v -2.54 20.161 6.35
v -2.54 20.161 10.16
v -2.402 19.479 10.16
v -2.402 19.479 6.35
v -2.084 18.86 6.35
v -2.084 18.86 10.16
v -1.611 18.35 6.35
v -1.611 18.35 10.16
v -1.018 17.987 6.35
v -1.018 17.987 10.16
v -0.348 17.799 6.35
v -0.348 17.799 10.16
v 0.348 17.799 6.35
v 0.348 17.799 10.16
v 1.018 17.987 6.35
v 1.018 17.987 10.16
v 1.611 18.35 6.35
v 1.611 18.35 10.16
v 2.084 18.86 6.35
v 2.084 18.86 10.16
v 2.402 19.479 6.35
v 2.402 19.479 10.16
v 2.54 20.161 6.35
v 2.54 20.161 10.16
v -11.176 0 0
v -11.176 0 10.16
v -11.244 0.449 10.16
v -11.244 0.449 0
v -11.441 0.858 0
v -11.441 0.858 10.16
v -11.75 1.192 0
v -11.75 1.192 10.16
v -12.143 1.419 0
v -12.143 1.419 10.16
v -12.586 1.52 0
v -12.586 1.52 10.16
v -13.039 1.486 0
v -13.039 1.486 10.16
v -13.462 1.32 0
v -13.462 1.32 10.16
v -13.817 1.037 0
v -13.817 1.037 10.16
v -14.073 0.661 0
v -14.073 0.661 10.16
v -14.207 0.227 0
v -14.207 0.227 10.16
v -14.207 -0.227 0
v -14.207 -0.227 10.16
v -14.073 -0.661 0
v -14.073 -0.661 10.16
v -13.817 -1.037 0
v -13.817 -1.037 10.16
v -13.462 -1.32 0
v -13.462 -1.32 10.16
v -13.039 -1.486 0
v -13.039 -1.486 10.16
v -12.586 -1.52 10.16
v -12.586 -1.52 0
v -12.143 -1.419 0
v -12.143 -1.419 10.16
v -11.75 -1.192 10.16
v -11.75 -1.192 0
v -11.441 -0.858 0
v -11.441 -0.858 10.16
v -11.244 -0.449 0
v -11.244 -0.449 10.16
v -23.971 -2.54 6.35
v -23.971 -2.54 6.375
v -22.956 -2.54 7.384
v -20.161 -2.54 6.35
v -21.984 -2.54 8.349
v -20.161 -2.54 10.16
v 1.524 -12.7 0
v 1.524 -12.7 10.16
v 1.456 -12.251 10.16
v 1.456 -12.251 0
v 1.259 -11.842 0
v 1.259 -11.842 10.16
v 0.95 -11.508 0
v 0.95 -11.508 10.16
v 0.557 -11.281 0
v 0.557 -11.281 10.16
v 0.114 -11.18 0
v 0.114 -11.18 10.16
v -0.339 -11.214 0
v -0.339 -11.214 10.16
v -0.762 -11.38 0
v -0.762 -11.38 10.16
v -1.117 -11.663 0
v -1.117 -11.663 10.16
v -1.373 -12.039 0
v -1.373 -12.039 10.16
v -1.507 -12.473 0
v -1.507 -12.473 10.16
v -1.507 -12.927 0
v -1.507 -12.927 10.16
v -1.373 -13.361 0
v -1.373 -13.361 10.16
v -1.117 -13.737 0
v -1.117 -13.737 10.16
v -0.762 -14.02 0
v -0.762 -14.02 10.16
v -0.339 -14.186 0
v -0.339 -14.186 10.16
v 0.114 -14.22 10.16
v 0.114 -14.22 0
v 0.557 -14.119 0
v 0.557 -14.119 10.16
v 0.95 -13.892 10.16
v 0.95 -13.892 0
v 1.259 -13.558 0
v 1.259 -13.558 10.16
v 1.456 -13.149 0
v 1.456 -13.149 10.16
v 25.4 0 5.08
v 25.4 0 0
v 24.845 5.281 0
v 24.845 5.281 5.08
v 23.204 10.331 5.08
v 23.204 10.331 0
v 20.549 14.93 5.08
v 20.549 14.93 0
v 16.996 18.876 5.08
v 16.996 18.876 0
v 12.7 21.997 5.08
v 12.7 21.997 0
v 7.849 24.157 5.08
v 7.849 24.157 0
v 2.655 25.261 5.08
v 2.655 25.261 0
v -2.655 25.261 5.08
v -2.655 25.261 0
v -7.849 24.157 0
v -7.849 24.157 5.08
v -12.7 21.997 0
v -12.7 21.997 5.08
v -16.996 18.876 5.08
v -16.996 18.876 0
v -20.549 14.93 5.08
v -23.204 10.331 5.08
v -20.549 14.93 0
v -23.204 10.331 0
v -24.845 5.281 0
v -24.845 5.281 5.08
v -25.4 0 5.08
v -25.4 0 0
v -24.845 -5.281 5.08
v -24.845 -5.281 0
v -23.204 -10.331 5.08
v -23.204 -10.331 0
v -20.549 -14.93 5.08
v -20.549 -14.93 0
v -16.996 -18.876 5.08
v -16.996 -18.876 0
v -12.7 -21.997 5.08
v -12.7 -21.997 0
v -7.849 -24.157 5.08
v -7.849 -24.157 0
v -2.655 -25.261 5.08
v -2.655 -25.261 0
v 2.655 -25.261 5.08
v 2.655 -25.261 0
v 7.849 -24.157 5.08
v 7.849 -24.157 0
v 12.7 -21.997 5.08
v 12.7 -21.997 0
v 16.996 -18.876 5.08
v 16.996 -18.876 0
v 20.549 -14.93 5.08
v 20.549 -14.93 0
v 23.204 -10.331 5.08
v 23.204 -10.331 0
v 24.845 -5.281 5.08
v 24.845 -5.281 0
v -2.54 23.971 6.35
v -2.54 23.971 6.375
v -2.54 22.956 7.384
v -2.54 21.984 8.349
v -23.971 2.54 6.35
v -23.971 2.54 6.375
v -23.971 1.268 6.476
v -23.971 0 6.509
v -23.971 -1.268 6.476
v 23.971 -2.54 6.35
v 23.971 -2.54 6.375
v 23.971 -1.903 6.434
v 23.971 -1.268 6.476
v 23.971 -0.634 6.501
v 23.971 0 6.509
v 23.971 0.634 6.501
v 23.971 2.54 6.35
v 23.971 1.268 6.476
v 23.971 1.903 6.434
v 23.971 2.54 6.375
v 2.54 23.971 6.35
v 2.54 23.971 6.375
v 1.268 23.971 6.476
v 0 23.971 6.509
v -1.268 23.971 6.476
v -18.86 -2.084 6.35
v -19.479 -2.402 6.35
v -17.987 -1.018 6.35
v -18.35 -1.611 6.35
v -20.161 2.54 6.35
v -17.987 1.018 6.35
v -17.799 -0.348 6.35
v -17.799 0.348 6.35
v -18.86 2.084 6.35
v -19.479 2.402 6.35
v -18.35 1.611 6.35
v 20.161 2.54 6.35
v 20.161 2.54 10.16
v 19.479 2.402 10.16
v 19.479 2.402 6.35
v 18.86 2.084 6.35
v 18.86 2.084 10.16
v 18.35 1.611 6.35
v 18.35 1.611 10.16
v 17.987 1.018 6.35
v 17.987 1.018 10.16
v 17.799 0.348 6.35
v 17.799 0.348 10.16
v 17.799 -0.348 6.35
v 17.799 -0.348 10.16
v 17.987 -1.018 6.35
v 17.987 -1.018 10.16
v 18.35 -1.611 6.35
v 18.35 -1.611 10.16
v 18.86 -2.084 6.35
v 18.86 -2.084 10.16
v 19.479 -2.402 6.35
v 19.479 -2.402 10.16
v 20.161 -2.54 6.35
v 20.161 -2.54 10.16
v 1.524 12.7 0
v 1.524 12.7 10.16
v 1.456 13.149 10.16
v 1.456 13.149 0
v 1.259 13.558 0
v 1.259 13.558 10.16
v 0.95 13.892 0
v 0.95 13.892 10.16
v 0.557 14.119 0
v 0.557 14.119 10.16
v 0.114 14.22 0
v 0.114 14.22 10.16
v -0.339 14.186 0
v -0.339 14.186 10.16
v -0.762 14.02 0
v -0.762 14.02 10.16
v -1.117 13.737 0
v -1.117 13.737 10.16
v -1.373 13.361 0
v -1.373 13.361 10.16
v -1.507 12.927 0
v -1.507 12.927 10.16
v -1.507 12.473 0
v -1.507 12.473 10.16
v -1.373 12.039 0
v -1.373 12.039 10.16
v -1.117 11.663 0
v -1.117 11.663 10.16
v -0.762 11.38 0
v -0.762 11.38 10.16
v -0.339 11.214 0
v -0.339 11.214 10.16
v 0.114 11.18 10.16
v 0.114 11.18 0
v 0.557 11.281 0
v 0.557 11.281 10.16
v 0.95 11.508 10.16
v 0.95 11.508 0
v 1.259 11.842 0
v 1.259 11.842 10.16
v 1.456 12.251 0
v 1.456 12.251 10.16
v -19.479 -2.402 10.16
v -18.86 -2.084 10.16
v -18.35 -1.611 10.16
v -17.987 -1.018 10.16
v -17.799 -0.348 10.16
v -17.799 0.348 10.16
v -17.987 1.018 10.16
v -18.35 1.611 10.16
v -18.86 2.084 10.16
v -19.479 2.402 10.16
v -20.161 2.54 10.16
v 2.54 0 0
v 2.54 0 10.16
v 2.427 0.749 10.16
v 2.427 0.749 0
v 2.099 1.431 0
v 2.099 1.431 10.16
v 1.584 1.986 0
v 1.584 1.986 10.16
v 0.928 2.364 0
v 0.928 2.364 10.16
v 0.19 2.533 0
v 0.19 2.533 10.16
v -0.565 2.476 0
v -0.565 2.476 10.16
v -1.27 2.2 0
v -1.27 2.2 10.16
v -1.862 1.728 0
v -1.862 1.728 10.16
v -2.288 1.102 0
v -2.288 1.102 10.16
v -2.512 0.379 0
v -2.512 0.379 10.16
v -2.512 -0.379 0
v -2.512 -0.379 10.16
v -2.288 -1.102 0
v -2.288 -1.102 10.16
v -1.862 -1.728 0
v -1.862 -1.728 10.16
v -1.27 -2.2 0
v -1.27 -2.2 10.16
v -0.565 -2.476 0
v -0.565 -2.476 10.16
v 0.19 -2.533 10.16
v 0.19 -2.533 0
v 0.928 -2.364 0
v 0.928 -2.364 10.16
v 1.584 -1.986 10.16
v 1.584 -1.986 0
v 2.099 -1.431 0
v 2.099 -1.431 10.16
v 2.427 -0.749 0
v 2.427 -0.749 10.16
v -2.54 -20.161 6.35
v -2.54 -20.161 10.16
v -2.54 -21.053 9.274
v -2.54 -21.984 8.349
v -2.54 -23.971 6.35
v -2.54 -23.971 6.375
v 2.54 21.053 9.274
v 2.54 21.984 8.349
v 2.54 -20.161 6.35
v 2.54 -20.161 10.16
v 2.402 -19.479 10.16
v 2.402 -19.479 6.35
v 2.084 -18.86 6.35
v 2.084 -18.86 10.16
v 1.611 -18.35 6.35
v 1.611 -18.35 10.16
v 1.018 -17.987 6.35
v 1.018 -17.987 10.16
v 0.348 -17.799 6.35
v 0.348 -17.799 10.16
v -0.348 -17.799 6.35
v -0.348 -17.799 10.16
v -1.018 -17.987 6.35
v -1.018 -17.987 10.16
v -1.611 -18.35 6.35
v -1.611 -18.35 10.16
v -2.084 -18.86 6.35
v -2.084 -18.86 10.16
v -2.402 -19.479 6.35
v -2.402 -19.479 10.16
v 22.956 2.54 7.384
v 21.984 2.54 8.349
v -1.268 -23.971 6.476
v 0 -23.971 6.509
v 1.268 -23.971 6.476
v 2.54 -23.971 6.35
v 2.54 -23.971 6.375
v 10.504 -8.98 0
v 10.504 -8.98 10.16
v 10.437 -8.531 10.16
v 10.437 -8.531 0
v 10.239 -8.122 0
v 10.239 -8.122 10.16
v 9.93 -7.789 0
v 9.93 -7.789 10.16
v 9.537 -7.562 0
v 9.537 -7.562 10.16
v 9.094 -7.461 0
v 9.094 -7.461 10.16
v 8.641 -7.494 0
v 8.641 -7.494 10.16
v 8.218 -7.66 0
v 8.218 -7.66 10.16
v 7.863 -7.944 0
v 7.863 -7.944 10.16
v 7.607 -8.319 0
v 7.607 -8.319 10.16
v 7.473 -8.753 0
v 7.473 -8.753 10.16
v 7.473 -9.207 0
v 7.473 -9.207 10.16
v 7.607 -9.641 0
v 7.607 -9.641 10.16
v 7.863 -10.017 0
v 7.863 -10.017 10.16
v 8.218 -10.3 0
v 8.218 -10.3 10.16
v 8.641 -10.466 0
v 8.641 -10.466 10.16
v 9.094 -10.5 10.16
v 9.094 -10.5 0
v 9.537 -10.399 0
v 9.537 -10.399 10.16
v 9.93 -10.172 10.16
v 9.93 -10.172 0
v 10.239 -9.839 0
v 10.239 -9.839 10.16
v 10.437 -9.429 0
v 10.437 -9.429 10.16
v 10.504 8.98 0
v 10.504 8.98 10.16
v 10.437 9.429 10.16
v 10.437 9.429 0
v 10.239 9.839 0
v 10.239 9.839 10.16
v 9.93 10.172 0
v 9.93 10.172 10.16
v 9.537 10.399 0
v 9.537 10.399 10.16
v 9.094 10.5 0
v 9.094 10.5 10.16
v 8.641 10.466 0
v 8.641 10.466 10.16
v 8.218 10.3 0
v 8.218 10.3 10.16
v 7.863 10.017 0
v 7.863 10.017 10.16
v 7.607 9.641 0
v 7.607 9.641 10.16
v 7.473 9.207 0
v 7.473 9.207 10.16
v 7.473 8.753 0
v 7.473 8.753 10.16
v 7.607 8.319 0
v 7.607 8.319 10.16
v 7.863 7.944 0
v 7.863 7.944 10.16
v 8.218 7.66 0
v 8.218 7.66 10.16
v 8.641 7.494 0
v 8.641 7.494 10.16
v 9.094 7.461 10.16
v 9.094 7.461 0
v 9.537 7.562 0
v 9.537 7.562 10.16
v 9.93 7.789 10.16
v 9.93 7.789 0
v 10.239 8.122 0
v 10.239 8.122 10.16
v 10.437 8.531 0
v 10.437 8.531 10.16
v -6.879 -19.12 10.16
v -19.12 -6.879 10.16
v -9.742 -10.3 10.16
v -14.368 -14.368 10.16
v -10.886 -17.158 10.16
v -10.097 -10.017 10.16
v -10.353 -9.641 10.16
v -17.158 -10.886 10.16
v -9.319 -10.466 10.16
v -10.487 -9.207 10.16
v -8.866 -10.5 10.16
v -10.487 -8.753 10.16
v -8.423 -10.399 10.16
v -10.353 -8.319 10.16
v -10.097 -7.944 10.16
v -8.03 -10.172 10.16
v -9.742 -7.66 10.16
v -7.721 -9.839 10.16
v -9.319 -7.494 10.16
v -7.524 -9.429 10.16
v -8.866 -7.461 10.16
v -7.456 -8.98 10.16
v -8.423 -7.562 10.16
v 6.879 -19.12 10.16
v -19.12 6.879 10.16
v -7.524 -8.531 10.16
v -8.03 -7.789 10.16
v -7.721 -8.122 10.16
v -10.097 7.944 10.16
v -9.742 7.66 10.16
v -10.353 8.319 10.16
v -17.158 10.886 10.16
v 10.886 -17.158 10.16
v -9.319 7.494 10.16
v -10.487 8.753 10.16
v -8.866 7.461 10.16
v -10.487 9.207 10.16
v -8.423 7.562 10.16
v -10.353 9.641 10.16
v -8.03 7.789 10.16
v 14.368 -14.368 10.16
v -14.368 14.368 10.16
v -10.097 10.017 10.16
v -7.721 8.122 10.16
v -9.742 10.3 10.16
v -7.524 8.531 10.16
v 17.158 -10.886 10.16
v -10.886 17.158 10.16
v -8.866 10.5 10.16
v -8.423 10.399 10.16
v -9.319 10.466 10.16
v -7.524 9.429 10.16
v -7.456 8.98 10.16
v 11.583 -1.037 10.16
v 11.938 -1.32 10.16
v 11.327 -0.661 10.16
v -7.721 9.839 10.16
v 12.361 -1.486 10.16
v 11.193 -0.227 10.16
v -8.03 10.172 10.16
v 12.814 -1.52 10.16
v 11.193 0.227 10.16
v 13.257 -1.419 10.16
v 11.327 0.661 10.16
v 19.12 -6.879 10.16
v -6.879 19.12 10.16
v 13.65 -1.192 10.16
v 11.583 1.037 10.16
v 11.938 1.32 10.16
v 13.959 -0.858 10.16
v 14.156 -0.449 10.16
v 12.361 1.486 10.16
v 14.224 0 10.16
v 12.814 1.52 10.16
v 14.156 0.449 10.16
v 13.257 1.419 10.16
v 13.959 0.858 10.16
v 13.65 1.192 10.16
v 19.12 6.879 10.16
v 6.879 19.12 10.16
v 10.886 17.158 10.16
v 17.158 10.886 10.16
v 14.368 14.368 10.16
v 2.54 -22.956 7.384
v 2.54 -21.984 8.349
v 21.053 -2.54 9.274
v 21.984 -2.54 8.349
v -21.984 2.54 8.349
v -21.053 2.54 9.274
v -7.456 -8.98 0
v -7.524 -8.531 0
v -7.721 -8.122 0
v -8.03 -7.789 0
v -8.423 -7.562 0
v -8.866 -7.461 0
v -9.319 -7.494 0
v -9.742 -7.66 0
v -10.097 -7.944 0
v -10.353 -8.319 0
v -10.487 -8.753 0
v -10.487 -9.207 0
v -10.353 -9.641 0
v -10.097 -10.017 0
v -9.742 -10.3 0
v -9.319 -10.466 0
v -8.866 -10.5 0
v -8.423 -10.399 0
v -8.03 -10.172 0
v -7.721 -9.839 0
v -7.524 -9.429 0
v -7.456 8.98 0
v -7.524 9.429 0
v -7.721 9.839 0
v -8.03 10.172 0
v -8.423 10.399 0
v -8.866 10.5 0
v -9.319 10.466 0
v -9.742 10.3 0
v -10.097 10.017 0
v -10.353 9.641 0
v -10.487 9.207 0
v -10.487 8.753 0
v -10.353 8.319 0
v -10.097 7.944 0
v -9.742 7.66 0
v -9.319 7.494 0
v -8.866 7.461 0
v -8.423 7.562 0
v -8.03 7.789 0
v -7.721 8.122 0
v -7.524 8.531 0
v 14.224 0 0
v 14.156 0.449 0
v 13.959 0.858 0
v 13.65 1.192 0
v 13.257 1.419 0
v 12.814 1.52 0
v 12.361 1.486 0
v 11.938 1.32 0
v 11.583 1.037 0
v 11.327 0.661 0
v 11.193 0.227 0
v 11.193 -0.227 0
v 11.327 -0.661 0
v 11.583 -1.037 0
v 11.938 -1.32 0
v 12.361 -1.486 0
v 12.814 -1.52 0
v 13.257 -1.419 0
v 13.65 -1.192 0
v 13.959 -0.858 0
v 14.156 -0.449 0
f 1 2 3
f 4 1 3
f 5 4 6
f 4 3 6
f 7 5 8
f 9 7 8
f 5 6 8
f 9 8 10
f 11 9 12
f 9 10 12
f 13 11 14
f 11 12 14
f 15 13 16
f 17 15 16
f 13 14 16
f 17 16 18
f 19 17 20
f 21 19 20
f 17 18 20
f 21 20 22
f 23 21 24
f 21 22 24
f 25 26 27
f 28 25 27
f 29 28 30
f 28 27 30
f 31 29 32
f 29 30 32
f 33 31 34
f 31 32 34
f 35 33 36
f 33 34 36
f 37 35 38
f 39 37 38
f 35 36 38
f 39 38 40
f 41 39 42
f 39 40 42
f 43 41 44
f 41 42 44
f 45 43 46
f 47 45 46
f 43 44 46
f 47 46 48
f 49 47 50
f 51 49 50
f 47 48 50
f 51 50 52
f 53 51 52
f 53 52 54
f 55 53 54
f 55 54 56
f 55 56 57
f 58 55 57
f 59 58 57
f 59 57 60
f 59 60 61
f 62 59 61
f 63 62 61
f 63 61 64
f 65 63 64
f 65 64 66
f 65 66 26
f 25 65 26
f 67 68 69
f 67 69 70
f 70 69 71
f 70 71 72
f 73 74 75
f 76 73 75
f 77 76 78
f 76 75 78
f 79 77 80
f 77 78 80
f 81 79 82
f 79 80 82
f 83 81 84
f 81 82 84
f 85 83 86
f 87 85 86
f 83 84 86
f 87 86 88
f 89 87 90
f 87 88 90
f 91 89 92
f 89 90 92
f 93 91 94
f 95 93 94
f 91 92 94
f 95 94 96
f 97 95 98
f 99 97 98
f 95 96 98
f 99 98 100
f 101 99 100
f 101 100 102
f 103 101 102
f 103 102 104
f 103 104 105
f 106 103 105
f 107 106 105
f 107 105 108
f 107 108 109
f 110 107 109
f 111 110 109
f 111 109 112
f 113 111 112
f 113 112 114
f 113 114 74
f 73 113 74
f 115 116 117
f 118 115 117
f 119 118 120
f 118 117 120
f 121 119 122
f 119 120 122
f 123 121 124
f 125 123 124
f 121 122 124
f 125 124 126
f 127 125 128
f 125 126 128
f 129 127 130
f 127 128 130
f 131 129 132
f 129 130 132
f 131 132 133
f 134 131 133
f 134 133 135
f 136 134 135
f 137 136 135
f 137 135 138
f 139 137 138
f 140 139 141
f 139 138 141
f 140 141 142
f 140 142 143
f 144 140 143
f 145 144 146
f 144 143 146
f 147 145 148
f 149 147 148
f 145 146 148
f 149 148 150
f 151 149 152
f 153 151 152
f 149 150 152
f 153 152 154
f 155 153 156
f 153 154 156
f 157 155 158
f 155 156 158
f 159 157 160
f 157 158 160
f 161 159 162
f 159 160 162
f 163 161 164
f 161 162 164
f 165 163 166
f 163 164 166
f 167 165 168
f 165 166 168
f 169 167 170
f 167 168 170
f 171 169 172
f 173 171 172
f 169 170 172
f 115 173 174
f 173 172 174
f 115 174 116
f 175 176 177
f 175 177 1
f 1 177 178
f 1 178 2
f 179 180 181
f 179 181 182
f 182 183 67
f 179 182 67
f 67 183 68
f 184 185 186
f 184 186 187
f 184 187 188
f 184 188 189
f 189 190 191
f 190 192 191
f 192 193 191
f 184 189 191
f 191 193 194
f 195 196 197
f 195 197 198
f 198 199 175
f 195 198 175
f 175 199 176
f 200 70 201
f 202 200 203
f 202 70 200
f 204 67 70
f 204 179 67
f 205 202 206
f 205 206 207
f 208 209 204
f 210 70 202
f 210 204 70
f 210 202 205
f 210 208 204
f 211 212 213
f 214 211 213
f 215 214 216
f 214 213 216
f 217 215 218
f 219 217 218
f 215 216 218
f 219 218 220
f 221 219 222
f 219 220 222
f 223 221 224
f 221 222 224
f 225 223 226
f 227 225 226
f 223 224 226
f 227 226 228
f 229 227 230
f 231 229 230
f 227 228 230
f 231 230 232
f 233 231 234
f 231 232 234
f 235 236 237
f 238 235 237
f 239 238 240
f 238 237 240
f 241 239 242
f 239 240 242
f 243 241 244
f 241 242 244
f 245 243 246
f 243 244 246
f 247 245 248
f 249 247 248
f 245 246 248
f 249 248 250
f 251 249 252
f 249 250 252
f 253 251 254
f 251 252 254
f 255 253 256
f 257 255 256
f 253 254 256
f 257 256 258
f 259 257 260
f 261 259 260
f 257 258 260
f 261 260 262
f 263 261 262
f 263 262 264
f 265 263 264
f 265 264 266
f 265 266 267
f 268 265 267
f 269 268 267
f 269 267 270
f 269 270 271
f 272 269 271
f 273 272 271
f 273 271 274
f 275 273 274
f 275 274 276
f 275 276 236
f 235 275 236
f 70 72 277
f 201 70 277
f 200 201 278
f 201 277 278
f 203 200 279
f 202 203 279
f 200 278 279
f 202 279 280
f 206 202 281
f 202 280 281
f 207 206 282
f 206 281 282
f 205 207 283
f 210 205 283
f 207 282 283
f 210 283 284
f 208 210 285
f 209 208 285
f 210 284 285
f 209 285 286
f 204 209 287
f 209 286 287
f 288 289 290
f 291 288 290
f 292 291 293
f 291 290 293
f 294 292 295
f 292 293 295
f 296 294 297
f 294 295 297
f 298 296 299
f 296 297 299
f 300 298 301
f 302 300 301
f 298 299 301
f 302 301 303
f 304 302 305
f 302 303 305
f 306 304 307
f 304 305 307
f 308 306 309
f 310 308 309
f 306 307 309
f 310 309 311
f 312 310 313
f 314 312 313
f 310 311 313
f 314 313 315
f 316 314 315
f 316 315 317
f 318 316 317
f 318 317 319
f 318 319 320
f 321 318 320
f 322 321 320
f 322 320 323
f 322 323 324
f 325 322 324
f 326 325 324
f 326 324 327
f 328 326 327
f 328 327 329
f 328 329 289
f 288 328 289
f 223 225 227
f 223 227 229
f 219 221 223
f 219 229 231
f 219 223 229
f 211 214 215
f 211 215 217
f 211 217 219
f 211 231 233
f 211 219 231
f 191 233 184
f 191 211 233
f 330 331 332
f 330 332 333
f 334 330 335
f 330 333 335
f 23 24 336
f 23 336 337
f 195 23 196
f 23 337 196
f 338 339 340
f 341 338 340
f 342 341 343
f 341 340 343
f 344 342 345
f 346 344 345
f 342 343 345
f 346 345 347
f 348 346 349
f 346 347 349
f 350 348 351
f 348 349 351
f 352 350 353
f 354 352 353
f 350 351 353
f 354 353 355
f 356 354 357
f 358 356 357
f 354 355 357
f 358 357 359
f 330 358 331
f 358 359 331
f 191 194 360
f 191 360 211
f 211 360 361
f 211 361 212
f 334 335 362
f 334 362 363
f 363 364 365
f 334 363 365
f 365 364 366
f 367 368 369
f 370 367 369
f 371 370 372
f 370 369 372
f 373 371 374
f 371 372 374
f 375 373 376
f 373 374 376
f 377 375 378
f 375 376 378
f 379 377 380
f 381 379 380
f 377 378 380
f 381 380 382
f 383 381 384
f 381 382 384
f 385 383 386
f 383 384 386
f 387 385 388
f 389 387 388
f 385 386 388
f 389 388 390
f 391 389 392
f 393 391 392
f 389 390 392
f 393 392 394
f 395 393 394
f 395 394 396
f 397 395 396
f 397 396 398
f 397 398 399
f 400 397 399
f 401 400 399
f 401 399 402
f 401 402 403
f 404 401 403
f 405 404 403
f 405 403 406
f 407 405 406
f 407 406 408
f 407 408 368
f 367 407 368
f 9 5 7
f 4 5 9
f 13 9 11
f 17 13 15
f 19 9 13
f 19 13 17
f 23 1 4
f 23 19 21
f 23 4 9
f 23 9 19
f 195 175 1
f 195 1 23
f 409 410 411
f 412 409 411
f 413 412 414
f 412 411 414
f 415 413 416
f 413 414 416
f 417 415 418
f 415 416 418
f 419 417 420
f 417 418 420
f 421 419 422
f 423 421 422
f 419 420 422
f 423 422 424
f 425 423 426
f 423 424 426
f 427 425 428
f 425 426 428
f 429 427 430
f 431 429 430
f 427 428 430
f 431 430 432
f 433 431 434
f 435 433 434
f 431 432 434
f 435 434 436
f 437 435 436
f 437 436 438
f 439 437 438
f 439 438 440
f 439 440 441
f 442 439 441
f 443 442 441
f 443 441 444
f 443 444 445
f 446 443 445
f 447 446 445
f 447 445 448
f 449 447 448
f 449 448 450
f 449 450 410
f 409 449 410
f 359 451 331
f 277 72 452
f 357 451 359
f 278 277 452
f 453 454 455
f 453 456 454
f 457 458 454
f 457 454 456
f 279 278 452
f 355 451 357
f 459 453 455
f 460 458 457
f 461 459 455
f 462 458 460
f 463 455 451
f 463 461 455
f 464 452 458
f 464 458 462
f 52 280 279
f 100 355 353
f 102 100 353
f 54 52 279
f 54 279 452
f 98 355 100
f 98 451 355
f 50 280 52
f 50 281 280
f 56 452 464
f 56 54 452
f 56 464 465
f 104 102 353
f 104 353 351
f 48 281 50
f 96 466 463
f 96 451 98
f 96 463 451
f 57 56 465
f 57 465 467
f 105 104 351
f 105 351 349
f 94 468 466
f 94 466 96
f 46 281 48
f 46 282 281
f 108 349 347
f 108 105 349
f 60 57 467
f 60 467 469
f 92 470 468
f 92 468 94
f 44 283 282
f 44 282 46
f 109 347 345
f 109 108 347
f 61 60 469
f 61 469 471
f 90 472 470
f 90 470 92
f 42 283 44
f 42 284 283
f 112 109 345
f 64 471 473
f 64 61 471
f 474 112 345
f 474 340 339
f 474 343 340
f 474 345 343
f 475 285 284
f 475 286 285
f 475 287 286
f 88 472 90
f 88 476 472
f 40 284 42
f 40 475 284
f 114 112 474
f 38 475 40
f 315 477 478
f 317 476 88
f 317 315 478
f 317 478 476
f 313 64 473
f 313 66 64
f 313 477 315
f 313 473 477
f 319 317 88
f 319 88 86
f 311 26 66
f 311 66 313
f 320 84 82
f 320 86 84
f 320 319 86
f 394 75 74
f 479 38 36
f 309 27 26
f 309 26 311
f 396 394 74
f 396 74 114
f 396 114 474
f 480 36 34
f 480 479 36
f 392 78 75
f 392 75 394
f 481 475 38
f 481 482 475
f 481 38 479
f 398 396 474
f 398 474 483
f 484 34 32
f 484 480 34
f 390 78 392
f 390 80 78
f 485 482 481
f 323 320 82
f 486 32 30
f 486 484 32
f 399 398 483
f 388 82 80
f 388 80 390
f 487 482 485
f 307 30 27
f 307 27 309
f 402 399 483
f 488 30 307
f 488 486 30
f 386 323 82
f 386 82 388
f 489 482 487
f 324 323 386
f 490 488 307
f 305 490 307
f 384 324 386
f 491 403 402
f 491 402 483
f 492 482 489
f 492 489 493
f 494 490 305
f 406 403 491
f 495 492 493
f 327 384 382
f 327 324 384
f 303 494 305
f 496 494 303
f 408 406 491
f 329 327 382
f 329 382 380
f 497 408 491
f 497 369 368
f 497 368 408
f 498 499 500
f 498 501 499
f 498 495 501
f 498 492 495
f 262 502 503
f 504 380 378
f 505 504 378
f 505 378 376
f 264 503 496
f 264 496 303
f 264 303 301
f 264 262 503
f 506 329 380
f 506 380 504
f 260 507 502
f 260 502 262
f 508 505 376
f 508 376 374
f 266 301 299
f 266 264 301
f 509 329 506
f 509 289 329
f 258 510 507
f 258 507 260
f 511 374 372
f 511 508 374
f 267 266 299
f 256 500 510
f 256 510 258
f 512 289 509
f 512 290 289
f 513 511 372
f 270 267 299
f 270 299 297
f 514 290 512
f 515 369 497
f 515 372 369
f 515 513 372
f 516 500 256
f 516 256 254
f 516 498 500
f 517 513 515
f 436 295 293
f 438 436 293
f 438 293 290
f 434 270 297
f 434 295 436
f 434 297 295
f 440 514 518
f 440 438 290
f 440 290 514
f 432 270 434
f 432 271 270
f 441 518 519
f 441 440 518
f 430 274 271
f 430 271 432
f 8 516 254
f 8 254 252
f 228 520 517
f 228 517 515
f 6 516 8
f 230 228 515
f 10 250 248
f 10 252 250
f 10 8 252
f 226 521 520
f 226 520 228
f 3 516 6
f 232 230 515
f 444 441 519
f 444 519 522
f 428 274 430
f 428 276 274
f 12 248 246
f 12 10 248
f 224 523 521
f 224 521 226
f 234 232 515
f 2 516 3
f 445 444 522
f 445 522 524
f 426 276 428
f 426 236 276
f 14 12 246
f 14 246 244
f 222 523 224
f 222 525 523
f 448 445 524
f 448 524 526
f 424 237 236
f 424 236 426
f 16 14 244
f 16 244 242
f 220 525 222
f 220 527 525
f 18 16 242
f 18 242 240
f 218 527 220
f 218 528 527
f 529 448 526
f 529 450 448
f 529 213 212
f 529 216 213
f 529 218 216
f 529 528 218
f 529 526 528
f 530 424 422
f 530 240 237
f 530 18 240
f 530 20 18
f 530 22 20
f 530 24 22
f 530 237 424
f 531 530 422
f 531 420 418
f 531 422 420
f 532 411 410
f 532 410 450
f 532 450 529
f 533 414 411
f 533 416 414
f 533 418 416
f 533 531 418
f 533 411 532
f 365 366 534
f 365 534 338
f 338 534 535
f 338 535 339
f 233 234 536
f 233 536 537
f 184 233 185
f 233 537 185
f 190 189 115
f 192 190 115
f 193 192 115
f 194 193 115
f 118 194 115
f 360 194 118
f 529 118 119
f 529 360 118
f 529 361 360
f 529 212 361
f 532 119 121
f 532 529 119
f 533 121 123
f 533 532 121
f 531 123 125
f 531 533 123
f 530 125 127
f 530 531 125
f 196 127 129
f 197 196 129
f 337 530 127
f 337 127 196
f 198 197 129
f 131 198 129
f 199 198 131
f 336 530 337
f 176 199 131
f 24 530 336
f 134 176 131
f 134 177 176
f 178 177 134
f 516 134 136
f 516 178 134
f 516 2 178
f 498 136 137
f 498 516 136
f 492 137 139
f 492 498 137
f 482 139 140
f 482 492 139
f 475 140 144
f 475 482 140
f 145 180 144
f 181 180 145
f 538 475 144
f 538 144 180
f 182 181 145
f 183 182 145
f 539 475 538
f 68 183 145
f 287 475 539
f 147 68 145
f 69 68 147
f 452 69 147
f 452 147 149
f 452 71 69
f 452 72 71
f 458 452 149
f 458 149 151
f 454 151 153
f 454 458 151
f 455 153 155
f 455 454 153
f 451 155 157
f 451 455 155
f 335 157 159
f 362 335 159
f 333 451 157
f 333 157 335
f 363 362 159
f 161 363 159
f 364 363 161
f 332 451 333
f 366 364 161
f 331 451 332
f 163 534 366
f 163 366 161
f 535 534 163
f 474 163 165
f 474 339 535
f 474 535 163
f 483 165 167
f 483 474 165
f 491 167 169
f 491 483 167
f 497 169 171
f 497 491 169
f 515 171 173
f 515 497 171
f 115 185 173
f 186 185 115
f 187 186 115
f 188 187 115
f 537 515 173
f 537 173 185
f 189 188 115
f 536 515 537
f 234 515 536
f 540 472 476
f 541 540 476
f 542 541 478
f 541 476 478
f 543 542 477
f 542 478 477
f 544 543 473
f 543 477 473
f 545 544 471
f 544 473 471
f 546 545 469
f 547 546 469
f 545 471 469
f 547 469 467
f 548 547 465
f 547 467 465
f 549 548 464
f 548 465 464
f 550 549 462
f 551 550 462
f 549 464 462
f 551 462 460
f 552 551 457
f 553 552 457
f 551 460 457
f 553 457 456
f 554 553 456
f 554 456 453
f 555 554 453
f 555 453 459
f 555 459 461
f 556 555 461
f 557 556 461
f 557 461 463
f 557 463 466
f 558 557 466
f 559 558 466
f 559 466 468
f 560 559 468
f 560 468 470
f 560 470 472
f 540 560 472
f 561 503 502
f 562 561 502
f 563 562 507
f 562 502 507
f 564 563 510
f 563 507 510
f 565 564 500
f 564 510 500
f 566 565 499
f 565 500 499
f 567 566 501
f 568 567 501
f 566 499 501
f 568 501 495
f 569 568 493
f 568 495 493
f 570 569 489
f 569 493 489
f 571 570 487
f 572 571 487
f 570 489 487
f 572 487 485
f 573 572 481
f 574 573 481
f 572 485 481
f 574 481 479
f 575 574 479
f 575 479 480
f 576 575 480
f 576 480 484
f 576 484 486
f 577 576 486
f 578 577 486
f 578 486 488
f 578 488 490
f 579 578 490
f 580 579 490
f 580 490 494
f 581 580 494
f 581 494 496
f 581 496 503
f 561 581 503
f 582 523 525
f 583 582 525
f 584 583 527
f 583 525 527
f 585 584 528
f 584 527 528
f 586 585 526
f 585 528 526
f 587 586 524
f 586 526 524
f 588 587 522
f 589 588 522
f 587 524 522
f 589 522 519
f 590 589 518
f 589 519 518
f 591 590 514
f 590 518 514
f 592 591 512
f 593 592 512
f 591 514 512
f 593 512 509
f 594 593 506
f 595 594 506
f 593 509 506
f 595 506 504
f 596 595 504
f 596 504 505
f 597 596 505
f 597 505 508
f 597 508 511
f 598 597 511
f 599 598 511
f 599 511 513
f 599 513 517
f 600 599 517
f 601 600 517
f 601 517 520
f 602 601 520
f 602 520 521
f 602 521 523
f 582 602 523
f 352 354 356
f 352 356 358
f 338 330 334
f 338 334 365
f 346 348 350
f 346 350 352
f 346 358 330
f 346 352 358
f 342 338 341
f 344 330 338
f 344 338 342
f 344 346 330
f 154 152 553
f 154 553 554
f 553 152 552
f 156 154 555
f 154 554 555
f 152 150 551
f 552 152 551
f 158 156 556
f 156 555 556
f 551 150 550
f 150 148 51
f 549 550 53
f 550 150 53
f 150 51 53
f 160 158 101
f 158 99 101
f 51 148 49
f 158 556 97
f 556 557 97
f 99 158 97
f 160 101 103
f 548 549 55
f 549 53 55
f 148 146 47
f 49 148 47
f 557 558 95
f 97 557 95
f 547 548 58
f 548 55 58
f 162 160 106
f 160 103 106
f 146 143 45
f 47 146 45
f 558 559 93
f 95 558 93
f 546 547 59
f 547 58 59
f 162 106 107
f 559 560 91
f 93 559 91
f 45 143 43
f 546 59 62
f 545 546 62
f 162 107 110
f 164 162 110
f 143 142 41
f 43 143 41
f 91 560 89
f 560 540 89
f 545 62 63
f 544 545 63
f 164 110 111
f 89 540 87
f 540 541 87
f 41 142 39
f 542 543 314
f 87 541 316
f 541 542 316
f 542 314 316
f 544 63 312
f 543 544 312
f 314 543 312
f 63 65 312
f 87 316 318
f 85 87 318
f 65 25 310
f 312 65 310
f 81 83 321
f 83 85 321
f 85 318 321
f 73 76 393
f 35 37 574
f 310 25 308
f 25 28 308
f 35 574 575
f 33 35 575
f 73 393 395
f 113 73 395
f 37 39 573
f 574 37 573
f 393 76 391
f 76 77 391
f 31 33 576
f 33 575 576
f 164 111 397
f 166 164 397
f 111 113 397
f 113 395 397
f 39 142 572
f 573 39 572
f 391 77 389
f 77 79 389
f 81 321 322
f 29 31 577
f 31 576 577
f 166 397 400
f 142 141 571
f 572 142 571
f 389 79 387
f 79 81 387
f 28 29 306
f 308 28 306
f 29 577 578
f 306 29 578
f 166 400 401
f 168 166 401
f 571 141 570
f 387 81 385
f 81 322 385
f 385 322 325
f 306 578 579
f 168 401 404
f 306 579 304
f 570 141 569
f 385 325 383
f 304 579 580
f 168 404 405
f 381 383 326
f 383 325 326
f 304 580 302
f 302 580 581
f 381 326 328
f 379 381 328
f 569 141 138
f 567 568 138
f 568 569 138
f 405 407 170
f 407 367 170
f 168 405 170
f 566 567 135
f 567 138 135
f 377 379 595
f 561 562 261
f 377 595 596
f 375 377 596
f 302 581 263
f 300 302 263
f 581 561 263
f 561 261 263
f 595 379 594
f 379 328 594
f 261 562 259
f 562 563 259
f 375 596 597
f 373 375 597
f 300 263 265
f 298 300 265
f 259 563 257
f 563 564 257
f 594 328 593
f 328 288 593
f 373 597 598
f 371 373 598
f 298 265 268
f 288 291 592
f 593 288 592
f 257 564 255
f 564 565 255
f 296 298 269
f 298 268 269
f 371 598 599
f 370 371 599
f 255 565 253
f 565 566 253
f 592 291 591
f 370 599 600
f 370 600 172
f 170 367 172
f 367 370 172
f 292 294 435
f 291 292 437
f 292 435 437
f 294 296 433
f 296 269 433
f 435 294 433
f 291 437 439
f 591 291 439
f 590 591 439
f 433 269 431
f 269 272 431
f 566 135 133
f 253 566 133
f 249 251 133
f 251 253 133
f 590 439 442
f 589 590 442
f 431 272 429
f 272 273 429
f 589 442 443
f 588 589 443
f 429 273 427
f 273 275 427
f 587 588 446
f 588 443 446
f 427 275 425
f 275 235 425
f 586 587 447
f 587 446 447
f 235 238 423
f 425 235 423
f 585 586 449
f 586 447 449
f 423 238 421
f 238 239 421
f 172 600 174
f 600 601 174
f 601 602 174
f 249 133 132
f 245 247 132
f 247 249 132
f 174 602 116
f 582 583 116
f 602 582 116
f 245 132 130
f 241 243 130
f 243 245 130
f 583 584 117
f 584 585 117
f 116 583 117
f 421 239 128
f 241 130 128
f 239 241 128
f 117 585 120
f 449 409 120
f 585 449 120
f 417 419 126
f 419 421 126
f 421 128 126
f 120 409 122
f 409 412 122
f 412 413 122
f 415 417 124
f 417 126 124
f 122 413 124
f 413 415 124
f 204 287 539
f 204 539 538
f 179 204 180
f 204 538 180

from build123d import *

# Parameters (mm, degrees)
F0_R     = 25.4
F1_DEPTH = 10.16
F2_SIZE  = 5.08
F3_R     = 2.54
F4_DEPTH = 10.161
F5_R     = 1.524
F6_DEPTH = 10.161
F8_DEPTH = 3.81


with BuildPart() as f1:
    # F0 (on Top) → F1 (new body)
    with BuildSketch(Plane.XY):
        Circle(F0_R)
    extrude(amount=F1_DEPTH)

    # F2
    f2_edges = [f1.edges().sort_by_distance(p)[0] for p in [
        (-25.4, 0, 10.16),
    ]]
    chamfer(f2_edges, length=F2_SIZE)

    # F3 (on face) → F4 (cut, through all)
    with BuildSketch(Plane.XY.offset(10.16)):
        Circle(F3_R)
    extrude(amount=-F4_DEPTH, mode=Mode.SUBTRACT)

    # F5 (on face) → F6 (cut, through all)
    with BuildSketch(Plane.XY.offset(10.16)):
        with Locations((-8.980256, -8.980256)):
            Circle(F5_R)
        with Locations((8.980256, -8.980256)):
            Circle(F5_R)
        with Locations((0, 12.7)):
            Circle(F5_R)
        with Locations((-8.980256, 8.980256)):
            Circle(F5_R)
        with Locations((-12.7, 0)):
            Circle(F5_R)
        with Locations((12.7, 0)):
            Circle(F5_R)
        with Locations((8.980256, 8.980256)):
            Circle(F5_R)
        with Locations((0, -12.7)):
            Circle(F5_R)
    extrude(amount=-F6_DEPTH, mode=Mode.SUBTRACT)

    # F7 (on face) → F8 (cut)
    with BuildSketch(Plane.XY.offset(10.16)):
        with BuildLine():
            Line((23.970625, 2.54), (20.160625, 2.54))
            ThreePointArc((20.160625, 2.54), (17.775005, 0), (20.160625, -2.54))
            Line((20.160625, -2.54), (23.970625, -2.54))
            Line((23.970625, -2.54), (23.970625, 2.54))
        make_face()
        with BuildLine():
            Line((-2.54, 23.970625), (-2.54, 20.160625))
            ThreePointArc((-2.54, 20.160625), (0, 17.775005), (2.54, 20.160625))
            Line((2.54, 20.160625), (2.54, 23.970625))
            Line((2.54, 23.970625), (-2.54, 23.970625))
        make_face()
        with BuildLine():
            Line((-23.970625, -2.54), (-20.160625, -2.54))
            ThreePointArc((-20.160625, -2.54), (-17.775005, 0), (-20.160625, 2.54))
            Line((-20.160625, 2.54), (-23.970625, 2.54))
            Line((-23.970625, 2.54), (-23.970625, -2.54))
        make_face()
        with BuildLine():
            Line((2.54, -23.970625), (2.54, -20.160625))
            ThreePointArc((2.54, -20.160625), (0, -17.775005), (-2.54, -20.160625))
            Line((-2.54, -20.160625), (-2.54, -23.970625))
            Line((-2.54, -23.970625), (2.54, -23.970625))
        make_face()
    extrude(amount=-F8_DEPTH, mode=Mode.SUBTRACT)


solid = f1.part
